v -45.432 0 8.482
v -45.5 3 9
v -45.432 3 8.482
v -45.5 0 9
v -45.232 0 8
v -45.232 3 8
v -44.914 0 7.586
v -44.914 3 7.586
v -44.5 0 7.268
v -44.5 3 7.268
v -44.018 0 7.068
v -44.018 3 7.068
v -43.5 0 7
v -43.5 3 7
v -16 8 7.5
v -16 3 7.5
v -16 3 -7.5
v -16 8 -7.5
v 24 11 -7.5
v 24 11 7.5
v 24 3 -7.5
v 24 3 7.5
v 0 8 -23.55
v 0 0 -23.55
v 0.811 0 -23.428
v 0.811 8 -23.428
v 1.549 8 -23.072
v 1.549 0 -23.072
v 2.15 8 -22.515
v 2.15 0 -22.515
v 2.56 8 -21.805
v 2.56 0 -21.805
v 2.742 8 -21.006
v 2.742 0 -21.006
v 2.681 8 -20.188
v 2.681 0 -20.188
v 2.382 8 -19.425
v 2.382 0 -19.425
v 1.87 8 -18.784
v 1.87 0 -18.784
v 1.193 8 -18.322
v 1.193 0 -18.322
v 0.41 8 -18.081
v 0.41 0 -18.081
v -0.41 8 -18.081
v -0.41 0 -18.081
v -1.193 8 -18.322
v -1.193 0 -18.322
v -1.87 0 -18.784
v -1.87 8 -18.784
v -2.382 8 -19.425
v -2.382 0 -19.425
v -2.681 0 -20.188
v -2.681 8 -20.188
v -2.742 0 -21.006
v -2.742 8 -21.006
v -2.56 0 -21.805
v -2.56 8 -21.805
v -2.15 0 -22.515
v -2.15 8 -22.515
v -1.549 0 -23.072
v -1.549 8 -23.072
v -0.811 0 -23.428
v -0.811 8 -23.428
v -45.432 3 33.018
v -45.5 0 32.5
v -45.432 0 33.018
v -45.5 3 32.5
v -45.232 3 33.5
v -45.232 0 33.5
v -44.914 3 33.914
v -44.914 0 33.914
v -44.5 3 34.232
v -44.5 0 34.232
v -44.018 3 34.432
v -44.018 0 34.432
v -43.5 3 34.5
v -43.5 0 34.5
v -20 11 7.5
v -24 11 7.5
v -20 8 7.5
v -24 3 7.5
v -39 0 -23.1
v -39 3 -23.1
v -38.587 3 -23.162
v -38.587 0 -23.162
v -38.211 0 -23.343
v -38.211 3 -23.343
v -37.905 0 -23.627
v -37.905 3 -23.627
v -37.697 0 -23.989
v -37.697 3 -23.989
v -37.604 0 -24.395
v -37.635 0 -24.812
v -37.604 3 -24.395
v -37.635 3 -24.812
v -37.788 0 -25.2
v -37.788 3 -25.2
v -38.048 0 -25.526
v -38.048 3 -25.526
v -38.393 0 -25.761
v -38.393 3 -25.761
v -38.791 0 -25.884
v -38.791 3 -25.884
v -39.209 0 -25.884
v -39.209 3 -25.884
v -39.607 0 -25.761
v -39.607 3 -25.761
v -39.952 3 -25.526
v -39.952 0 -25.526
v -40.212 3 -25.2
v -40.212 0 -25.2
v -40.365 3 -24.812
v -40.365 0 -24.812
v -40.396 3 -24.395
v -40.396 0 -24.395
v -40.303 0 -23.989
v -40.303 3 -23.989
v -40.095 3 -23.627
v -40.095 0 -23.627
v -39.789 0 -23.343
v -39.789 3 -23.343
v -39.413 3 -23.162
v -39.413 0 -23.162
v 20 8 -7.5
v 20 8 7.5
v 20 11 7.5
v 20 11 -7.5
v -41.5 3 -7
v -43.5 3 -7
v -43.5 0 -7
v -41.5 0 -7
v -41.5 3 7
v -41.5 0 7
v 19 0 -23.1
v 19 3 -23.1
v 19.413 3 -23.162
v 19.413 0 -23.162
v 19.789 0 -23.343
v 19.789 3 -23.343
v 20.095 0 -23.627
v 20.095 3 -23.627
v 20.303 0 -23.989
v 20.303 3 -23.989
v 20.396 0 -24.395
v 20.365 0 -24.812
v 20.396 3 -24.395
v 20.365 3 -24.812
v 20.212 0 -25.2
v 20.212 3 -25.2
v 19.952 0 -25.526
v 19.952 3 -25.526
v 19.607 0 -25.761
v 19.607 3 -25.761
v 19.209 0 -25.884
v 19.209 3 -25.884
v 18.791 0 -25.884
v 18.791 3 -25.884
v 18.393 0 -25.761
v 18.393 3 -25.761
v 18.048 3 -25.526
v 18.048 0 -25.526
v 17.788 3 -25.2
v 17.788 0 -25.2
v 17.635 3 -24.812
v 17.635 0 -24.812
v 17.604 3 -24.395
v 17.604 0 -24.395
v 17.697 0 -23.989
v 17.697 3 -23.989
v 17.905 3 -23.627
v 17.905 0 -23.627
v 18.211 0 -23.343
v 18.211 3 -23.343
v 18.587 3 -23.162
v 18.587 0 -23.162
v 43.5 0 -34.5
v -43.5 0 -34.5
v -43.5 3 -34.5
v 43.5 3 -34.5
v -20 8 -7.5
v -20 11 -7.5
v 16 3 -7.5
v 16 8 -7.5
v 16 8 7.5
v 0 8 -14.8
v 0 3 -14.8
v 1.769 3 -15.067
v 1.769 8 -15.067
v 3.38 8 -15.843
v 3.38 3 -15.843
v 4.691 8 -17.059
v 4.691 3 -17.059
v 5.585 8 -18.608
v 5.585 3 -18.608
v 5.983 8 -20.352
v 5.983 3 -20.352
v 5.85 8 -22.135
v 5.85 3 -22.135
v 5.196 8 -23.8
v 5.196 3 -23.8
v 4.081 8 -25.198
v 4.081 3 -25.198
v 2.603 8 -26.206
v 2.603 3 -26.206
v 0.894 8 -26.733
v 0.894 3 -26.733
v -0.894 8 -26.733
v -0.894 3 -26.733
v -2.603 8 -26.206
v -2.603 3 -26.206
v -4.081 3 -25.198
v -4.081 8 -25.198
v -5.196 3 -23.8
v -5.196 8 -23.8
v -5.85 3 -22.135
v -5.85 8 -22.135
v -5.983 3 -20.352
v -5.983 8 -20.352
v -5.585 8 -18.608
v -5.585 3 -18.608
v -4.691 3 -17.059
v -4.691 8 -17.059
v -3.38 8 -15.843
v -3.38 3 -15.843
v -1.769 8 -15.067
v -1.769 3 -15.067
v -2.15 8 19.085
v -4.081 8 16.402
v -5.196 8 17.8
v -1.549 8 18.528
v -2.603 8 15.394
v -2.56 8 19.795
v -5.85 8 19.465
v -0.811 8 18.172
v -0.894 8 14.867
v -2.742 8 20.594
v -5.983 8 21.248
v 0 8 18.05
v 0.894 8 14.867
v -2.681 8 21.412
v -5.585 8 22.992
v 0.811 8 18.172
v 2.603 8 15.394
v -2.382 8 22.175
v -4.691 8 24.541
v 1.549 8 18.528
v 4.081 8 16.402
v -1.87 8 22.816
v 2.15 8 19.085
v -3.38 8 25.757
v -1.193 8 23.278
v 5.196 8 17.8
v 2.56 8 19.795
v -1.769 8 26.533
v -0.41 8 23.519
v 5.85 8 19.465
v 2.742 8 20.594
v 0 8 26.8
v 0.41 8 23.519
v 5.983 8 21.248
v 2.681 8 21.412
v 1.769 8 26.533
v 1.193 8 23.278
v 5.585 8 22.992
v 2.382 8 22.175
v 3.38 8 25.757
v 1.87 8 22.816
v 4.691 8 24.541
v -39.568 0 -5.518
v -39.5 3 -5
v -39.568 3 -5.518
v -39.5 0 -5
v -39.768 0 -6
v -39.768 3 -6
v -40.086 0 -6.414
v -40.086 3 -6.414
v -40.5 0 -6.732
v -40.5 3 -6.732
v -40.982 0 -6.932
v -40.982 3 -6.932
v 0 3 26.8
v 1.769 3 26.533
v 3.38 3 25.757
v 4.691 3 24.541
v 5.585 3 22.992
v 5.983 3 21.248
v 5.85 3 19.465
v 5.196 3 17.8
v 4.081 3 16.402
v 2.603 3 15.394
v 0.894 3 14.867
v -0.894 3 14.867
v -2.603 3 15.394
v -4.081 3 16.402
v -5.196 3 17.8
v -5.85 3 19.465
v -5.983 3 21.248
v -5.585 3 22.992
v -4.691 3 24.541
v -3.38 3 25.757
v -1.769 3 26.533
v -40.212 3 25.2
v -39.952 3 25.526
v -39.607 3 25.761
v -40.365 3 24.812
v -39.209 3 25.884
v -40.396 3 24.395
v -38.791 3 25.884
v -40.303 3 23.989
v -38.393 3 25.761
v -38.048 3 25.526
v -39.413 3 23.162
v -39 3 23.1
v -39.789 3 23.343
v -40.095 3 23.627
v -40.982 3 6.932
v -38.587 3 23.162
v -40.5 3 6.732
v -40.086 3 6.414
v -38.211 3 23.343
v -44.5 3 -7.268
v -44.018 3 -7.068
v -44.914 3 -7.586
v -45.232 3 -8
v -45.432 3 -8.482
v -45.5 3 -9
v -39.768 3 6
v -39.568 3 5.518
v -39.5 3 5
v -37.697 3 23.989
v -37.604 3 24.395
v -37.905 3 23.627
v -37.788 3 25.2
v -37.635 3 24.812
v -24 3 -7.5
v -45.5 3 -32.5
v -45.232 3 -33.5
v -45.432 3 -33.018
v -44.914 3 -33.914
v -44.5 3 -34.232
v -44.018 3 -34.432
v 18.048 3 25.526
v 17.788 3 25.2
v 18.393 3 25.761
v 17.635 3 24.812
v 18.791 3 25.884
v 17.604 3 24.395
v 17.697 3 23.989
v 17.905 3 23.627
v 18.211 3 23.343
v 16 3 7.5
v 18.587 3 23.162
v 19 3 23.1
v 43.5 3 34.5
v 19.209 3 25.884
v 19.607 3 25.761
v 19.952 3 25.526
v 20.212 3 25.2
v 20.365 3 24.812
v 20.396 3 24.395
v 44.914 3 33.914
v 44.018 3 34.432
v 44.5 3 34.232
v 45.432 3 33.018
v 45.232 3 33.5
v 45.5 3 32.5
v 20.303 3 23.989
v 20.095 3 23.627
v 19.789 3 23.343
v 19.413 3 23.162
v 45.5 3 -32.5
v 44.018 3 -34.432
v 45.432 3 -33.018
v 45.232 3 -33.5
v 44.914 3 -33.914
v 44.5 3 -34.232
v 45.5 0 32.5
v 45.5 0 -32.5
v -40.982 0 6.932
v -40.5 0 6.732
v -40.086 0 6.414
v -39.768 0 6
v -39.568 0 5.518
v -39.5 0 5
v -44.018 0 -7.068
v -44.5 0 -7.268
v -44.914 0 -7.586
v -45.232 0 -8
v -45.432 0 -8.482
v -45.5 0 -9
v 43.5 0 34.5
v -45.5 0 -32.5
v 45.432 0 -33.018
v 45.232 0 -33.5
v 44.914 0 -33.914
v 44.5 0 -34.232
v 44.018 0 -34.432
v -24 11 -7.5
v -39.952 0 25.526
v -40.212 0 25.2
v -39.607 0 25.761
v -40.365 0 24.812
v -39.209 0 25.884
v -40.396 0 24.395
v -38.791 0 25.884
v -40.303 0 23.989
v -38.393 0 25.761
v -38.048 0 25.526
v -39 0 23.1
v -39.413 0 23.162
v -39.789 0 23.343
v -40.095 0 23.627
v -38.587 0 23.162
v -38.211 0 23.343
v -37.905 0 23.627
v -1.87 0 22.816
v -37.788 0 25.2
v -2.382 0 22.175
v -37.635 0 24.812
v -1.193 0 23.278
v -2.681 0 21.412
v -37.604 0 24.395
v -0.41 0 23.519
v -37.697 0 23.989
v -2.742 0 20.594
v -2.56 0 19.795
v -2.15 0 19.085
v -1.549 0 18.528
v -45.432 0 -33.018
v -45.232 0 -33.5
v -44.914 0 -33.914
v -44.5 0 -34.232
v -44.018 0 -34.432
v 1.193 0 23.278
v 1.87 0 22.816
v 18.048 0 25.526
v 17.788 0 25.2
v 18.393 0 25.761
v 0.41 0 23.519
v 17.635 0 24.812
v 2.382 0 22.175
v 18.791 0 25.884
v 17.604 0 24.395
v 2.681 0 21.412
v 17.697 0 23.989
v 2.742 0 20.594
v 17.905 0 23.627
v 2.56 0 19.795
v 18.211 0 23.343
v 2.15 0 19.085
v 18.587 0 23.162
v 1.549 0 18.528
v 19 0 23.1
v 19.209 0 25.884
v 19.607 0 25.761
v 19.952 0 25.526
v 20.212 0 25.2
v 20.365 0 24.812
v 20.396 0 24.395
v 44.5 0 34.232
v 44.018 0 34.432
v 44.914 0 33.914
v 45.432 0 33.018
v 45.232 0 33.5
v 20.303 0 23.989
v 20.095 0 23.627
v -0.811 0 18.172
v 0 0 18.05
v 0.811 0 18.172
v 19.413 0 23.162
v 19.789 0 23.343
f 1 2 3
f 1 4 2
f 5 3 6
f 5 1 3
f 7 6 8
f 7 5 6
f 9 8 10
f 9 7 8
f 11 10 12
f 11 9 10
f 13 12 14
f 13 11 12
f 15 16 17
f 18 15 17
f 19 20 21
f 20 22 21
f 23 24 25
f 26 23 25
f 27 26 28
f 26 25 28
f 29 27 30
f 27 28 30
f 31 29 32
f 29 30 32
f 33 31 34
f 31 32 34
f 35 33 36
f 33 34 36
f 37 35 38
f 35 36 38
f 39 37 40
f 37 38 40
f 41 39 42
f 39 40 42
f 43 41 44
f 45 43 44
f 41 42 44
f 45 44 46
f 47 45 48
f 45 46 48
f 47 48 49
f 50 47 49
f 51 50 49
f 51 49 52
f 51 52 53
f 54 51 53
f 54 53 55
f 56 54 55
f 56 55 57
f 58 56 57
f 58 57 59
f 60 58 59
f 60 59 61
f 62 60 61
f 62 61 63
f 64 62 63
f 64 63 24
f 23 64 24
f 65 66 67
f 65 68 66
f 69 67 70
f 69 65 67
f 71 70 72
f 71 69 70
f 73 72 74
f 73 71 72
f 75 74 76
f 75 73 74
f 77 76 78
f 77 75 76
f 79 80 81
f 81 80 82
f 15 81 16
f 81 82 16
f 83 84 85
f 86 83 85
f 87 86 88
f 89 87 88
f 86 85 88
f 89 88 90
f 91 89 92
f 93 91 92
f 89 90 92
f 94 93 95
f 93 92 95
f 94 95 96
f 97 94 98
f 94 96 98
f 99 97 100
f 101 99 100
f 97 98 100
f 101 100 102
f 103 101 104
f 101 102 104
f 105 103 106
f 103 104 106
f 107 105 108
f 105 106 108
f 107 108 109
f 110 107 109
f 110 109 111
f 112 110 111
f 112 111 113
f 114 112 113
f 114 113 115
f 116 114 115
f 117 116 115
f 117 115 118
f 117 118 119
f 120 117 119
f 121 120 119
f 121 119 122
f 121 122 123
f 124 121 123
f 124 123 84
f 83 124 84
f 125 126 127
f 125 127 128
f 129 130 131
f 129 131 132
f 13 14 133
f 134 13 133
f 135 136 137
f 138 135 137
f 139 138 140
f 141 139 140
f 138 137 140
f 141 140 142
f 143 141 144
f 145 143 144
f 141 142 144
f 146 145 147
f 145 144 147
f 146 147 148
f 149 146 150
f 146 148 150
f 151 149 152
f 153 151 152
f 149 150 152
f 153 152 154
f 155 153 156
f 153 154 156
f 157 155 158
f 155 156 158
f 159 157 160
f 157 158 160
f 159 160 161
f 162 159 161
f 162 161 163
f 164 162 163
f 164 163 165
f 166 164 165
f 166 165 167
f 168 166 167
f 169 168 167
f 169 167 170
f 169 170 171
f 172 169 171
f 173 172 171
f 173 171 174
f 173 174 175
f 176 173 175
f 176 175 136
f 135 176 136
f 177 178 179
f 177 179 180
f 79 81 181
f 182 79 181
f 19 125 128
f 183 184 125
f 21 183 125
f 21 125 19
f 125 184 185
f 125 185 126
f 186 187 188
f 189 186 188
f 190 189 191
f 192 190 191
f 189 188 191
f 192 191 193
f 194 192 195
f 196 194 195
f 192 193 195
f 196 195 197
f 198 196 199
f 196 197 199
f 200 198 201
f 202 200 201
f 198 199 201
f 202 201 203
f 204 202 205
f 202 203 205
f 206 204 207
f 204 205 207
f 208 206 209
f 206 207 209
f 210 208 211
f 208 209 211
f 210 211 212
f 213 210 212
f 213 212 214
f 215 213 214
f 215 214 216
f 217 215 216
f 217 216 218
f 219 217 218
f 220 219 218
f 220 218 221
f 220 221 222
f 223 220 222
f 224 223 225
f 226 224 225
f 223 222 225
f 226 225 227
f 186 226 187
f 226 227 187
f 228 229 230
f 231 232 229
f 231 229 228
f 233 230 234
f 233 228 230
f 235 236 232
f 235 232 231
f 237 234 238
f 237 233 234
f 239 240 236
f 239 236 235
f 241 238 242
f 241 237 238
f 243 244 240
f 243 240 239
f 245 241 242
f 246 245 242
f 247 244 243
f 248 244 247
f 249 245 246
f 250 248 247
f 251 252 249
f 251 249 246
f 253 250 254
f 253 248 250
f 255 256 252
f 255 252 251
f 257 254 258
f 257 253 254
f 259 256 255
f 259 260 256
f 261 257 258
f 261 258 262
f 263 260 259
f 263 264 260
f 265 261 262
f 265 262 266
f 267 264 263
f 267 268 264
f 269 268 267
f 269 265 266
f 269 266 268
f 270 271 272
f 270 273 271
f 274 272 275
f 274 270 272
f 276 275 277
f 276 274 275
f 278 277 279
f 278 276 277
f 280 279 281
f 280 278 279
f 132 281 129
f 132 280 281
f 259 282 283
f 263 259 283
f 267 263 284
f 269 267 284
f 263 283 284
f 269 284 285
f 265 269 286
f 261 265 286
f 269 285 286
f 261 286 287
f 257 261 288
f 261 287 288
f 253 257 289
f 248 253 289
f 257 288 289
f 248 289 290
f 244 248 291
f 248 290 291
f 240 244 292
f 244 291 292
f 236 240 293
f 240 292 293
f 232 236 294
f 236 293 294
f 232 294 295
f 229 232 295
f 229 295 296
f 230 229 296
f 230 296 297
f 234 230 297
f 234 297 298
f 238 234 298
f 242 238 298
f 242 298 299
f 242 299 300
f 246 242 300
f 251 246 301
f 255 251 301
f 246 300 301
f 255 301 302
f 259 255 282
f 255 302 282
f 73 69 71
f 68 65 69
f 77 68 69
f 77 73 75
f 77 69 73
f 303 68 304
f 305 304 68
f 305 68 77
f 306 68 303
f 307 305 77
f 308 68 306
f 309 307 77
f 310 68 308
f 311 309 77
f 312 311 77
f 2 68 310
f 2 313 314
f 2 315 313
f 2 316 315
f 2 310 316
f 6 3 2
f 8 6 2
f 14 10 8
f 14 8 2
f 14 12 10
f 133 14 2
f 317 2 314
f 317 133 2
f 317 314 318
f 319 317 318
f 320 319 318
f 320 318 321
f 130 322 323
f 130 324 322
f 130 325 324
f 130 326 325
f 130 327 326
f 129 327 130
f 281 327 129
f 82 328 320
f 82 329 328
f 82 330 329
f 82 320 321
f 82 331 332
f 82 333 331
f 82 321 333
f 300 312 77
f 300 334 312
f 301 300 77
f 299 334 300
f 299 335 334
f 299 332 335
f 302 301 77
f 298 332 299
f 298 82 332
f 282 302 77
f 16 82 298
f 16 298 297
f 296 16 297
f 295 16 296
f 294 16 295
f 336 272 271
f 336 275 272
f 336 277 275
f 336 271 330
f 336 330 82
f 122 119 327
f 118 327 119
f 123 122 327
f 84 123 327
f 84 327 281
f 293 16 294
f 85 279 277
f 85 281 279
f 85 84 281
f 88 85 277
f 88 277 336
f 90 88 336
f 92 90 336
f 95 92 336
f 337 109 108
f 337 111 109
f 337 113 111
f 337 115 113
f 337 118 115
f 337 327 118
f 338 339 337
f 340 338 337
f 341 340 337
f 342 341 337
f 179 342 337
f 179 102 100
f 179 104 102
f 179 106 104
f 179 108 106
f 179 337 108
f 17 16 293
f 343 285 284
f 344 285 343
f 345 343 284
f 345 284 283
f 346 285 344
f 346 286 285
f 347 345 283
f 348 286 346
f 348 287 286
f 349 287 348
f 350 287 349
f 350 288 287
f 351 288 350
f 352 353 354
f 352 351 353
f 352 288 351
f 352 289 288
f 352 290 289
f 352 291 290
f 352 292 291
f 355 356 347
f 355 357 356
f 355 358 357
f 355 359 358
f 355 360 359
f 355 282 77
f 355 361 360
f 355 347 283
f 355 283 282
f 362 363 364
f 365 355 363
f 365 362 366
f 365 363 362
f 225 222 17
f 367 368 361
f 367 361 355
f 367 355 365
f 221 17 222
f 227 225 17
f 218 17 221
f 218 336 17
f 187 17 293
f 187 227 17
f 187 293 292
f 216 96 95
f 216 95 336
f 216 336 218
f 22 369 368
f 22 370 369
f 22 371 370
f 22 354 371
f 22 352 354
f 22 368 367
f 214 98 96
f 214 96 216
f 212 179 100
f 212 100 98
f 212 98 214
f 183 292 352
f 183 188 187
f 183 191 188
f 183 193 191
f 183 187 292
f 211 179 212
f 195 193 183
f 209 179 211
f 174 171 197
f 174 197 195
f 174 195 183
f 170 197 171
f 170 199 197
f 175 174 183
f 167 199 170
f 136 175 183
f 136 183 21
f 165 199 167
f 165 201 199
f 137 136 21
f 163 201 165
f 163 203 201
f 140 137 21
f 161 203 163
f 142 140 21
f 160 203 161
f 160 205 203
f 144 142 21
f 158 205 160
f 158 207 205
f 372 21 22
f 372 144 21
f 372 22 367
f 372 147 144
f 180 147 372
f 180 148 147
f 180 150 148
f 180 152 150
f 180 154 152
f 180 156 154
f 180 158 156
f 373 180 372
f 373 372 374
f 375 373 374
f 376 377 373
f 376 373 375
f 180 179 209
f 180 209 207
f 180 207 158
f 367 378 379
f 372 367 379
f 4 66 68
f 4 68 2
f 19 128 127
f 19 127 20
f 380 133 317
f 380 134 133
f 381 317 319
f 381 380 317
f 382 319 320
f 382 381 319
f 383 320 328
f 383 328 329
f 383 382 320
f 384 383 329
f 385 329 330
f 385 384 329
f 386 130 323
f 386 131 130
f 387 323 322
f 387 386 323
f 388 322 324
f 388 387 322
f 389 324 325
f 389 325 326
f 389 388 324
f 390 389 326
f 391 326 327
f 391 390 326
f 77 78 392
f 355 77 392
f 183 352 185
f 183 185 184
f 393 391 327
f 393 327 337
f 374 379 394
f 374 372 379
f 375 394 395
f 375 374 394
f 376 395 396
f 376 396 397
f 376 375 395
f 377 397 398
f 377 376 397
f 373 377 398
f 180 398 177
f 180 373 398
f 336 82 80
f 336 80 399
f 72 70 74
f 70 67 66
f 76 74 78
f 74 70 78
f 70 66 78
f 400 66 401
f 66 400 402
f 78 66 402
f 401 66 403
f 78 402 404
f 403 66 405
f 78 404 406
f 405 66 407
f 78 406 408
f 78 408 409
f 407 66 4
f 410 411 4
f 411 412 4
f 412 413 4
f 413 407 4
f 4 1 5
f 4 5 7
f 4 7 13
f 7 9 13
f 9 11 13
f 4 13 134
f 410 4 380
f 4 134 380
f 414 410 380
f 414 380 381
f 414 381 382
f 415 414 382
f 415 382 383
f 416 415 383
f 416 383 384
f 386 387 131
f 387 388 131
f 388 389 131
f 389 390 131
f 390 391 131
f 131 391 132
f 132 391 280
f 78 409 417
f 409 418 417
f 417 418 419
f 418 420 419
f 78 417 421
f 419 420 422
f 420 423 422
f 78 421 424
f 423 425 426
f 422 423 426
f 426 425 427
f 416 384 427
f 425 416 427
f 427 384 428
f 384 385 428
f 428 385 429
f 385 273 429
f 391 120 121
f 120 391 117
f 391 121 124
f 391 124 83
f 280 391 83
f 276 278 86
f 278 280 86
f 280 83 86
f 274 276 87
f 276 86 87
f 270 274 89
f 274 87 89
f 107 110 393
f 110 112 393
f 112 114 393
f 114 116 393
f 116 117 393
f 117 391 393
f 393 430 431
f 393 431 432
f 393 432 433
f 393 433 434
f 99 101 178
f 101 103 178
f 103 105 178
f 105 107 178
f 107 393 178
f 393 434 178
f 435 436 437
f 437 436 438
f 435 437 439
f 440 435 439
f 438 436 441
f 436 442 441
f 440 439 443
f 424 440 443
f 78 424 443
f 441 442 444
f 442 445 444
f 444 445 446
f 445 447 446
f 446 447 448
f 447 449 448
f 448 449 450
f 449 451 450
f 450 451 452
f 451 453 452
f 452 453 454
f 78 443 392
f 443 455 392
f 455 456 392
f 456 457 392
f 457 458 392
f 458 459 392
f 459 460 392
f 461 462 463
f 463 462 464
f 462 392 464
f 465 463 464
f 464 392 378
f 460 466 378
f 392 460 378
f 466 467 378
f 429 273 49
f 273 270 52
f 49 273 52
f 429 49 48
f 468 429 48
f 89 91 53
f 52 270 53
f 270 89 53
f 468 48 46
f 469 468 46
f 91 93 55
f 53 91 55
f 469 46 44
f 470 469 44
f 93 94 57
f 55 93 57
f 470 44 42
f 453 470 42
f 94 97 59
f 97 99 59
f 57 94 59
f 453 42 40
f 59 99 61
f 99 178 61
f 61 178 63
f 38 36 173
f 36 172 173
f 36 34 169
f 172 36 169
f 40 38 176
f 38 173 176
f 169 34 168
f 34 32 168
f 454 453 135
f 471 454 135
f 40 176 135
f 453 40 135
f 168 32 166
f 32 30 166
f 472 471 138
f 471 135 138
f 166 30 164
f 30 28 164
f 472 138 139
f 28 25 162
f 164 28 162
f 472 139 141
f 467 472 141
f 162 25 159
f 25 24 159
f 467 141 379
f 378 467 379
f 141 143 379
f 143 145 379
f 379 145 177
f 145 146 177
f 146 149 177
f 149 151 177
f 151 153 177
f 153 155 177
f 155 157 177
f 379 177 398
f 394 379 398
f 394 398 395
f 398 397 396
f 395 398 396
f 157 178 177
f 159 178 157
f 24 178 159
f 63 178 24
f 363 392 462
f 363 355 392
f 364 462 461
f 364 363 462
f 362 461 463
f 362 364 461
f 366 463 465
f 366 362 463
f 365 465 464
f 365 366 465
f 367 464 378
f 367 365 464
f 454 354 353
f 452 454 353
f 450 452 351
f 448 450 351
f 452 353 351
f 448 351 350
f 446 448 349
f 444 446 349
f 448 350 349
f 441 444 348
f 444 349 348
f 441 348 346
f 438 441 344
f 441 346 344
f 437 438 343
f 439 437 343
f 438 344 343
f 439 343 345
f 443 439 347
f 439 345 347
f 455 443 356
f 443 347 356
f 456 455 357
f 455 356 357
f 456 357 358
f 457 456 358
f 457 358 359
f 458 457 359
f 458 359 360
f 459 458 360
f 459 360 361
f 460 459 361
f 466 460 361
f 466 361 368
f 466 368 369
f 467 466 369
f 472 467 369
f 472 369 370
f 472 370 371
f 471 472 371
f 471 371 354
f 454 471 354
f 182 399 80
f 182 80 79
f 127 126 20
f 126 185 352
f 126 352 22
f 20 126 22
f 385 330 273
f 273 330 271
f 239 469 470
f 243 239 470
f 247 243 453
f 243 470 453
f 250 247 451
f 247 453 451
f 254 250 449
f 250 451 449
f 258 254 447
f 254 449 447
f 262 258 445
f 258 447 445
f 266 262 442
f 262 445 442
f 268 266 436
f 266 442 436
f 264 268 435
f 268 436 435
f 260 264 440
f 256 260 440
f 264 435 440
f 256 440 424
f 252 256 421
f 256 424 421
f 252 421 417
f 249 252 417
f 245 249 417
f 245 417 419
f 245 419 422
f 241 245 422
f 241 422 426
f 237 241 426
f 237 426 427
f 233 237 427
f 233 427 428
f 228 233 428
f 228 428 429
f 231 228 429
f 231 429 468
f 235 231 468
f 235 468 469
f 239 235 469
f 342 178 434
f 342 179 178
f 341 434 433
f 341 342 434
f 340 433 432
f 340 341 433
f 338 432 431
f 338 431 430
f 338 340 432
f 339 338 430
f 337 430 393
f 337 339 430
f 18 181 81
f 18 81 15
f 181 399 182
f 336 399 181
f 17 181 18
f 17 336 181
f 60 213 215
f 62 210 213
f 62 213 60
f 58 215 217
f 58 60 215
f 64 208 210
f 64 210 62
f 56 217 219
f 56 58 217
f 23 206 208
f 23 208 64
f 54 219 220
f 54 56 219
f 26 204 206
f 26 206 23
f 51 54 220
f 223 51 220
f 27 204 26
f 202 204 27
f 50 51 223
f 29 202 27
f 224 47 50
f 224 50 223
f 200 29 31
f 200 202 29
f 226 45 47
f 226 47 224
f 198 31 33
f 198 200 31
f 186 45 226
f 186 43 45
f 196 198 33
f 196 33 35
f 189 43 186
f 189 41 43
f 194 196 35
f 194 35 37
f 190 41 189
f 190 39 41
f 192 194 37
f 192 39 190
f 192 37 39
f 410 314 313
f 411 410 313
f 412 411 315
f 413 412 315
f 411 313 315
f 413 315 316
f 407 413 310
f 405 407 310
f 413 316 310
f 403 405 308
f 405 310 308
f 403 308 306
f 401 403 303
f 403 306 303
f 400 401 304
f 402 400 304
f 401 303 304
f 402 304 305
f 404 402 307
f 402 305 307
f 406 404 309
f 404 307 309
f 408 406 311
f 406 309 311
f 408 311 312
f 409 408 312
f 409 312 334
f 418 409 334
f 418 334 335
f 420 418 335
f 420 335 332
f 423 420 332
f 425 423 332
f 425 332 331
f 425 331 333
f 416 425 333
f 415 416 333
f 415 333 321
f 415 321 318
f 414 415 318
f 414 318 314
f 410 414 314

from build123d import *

# Parameters (mm, degrees)
SKETCH1_W           = 91
SKETCH1_H           = 69
BOSS_EXTRUDE1_DEPTH = 3
SKETCH2_W           = 6
SKETCH2_H           = 14
CUT_EXTRUDE1_DEPTH  = 58.179541796
SKETCH3_R           = 1.4
CUT_EXTRUDE2_DEPTH  = 58.179541796
FILLET1_R           = 2
SKETCH6_R           = 6
SKETCH6_W           = 8
SKETCH6_H           = 15
BOSS_EXTRUDE2_DEPTH = 5
SKETCH5_R           = 2.75
CUT_EXTRUDE3_DEPTH  = 58.658477261
SKETCH7_W           = 4
SKETCH7_H           = 15
BOSS_EXTRUDE3_DEPTH = 3


with BuildPart() as part:
    # Sketch1 → Boss-Extrude1 (new body)
    with BuildSketch(Plane(origin=(0, 0, 0), x_dir=(1, 0, 0), z_dir=(0, 1, 0))):
        Rectangle(SKETCH1_W, SKETCH1_H)
    extrude(amount=BOSS_EXTRUDE1_DEPTH)

    # Sketch2 → Cut-Extrude1 (cut, through all)
    with BuildSketch(Plane(origin=(0, 3, 0), x_dir=(1, 0, 0), z_dir=(0, 1, 0))):
        with Locations((-42.5, 0)):
            Rectangle(SKETCH2_W, SKETCH2_H)
    extrude(amount=-CUT_EXTRUDE1_DEPTH, mode=Mode.SUBTRACT)

    # Sketch3 → Cut-Extrude2 (cut, through all)
    with BuildSketch(Plane(origin=(0, 3, 0), x_dir=(1, 0, 0), z_dir=(0, 1, 0))):
        with Locations(Location((-39, 24.5, 0), (0, 0, 270))):
            Circle(SKETCH3_R)
        with Locations(Location((19, 24.5, 0), (0, 0, 270))):
            Circle(SKETCH3_R)
        with Locations(Location((19, -24.5, 0), (0, 0, 90))):
            Circle(SKETCH3_R)
        with Locations(Location((-39, -24.5, 0), (0, 0, 90))):
            Circle(SKETCH3_R)
    extrude(amount=-CUT_EXTRUDE2_DEPTH, mode=Mode.SUBTRACT)

    # Fillet1
    fillet1_edges = [part.edges().sort_by_distance(p)[0] for p in [
        (-45.5, 1.5, 7),
        (-45.5, 1.5, -7),
        (-39.5, 1.5, -7),
        (-39.5, 1.5, 7),
        (45.5, 1.5, 34.5),
        (-45.5, 1.5, 34.5),
        (-45.5, 1.5, -34.5),
        (45.5, 1.5, -34.5),
    ]]
    fillet(fillet1_edges, radius=FILLET1_R)

    # Sketch6 → Boss-Extrude2 (add)
    with BuildSketch(Plane(origin=(0, 3, 0), x_dir=(1, 0, 0), z_dir=(0, 1, 0))):
        with Locations(Location((0, -20.8, 0), (0, 0, 270))):
            Circle(SKETCH6_R)
        with Locations(Location((0, 20.8, 0), (0, 0, 270))):
            Circle(SKETCH6_R)
        with Locations((-20, 0)):
            Rectangle(SKETCH6_W, SKETCH6_H)
        with Locations((20, 0)):
            Rectangle(SKETCH6_W, SKETCH6_H)
    extrude(amount=BOSS_EXTRUDE2_DEPTH)

    # Sketch5 → Cut-Extrude3 (cut, through all)
    with BuildSketch(Plane(origin=(0, 0, 0), x_dir=(-1, 0, 0), z_dir=(0, -1, 0))):
        with Locations(Location((0, -20.8, 0), (0, 0, 90))):
            Circle(SKETCH5_R)
        with Locations(Location((0, 20.8, 0), (0, 0, 90))):
            Circle(SKETCH5_R)
    extrude(amount=-CUT_EXTRUDE3_DEPTH, mode=Mode.SUBTRACT)

    # Sketch7 → Boss-Extrude3 (add)
    with BuildSketch(Plane(origin=(0, 8, 0), x_dir=(1, 0, 0), z_dir=(0, 1, 0))):
        with Locations((22, 0)):
            Rectangle(SKETCH7_W, SKETCH7_H)
        with Locations((-22, 0)):
            Rectangle(SKETCH7_W, SKETCH7_H)
    extrude(amount=BOSS_EXTRUDE3_DEPTH)


solid = part.part
